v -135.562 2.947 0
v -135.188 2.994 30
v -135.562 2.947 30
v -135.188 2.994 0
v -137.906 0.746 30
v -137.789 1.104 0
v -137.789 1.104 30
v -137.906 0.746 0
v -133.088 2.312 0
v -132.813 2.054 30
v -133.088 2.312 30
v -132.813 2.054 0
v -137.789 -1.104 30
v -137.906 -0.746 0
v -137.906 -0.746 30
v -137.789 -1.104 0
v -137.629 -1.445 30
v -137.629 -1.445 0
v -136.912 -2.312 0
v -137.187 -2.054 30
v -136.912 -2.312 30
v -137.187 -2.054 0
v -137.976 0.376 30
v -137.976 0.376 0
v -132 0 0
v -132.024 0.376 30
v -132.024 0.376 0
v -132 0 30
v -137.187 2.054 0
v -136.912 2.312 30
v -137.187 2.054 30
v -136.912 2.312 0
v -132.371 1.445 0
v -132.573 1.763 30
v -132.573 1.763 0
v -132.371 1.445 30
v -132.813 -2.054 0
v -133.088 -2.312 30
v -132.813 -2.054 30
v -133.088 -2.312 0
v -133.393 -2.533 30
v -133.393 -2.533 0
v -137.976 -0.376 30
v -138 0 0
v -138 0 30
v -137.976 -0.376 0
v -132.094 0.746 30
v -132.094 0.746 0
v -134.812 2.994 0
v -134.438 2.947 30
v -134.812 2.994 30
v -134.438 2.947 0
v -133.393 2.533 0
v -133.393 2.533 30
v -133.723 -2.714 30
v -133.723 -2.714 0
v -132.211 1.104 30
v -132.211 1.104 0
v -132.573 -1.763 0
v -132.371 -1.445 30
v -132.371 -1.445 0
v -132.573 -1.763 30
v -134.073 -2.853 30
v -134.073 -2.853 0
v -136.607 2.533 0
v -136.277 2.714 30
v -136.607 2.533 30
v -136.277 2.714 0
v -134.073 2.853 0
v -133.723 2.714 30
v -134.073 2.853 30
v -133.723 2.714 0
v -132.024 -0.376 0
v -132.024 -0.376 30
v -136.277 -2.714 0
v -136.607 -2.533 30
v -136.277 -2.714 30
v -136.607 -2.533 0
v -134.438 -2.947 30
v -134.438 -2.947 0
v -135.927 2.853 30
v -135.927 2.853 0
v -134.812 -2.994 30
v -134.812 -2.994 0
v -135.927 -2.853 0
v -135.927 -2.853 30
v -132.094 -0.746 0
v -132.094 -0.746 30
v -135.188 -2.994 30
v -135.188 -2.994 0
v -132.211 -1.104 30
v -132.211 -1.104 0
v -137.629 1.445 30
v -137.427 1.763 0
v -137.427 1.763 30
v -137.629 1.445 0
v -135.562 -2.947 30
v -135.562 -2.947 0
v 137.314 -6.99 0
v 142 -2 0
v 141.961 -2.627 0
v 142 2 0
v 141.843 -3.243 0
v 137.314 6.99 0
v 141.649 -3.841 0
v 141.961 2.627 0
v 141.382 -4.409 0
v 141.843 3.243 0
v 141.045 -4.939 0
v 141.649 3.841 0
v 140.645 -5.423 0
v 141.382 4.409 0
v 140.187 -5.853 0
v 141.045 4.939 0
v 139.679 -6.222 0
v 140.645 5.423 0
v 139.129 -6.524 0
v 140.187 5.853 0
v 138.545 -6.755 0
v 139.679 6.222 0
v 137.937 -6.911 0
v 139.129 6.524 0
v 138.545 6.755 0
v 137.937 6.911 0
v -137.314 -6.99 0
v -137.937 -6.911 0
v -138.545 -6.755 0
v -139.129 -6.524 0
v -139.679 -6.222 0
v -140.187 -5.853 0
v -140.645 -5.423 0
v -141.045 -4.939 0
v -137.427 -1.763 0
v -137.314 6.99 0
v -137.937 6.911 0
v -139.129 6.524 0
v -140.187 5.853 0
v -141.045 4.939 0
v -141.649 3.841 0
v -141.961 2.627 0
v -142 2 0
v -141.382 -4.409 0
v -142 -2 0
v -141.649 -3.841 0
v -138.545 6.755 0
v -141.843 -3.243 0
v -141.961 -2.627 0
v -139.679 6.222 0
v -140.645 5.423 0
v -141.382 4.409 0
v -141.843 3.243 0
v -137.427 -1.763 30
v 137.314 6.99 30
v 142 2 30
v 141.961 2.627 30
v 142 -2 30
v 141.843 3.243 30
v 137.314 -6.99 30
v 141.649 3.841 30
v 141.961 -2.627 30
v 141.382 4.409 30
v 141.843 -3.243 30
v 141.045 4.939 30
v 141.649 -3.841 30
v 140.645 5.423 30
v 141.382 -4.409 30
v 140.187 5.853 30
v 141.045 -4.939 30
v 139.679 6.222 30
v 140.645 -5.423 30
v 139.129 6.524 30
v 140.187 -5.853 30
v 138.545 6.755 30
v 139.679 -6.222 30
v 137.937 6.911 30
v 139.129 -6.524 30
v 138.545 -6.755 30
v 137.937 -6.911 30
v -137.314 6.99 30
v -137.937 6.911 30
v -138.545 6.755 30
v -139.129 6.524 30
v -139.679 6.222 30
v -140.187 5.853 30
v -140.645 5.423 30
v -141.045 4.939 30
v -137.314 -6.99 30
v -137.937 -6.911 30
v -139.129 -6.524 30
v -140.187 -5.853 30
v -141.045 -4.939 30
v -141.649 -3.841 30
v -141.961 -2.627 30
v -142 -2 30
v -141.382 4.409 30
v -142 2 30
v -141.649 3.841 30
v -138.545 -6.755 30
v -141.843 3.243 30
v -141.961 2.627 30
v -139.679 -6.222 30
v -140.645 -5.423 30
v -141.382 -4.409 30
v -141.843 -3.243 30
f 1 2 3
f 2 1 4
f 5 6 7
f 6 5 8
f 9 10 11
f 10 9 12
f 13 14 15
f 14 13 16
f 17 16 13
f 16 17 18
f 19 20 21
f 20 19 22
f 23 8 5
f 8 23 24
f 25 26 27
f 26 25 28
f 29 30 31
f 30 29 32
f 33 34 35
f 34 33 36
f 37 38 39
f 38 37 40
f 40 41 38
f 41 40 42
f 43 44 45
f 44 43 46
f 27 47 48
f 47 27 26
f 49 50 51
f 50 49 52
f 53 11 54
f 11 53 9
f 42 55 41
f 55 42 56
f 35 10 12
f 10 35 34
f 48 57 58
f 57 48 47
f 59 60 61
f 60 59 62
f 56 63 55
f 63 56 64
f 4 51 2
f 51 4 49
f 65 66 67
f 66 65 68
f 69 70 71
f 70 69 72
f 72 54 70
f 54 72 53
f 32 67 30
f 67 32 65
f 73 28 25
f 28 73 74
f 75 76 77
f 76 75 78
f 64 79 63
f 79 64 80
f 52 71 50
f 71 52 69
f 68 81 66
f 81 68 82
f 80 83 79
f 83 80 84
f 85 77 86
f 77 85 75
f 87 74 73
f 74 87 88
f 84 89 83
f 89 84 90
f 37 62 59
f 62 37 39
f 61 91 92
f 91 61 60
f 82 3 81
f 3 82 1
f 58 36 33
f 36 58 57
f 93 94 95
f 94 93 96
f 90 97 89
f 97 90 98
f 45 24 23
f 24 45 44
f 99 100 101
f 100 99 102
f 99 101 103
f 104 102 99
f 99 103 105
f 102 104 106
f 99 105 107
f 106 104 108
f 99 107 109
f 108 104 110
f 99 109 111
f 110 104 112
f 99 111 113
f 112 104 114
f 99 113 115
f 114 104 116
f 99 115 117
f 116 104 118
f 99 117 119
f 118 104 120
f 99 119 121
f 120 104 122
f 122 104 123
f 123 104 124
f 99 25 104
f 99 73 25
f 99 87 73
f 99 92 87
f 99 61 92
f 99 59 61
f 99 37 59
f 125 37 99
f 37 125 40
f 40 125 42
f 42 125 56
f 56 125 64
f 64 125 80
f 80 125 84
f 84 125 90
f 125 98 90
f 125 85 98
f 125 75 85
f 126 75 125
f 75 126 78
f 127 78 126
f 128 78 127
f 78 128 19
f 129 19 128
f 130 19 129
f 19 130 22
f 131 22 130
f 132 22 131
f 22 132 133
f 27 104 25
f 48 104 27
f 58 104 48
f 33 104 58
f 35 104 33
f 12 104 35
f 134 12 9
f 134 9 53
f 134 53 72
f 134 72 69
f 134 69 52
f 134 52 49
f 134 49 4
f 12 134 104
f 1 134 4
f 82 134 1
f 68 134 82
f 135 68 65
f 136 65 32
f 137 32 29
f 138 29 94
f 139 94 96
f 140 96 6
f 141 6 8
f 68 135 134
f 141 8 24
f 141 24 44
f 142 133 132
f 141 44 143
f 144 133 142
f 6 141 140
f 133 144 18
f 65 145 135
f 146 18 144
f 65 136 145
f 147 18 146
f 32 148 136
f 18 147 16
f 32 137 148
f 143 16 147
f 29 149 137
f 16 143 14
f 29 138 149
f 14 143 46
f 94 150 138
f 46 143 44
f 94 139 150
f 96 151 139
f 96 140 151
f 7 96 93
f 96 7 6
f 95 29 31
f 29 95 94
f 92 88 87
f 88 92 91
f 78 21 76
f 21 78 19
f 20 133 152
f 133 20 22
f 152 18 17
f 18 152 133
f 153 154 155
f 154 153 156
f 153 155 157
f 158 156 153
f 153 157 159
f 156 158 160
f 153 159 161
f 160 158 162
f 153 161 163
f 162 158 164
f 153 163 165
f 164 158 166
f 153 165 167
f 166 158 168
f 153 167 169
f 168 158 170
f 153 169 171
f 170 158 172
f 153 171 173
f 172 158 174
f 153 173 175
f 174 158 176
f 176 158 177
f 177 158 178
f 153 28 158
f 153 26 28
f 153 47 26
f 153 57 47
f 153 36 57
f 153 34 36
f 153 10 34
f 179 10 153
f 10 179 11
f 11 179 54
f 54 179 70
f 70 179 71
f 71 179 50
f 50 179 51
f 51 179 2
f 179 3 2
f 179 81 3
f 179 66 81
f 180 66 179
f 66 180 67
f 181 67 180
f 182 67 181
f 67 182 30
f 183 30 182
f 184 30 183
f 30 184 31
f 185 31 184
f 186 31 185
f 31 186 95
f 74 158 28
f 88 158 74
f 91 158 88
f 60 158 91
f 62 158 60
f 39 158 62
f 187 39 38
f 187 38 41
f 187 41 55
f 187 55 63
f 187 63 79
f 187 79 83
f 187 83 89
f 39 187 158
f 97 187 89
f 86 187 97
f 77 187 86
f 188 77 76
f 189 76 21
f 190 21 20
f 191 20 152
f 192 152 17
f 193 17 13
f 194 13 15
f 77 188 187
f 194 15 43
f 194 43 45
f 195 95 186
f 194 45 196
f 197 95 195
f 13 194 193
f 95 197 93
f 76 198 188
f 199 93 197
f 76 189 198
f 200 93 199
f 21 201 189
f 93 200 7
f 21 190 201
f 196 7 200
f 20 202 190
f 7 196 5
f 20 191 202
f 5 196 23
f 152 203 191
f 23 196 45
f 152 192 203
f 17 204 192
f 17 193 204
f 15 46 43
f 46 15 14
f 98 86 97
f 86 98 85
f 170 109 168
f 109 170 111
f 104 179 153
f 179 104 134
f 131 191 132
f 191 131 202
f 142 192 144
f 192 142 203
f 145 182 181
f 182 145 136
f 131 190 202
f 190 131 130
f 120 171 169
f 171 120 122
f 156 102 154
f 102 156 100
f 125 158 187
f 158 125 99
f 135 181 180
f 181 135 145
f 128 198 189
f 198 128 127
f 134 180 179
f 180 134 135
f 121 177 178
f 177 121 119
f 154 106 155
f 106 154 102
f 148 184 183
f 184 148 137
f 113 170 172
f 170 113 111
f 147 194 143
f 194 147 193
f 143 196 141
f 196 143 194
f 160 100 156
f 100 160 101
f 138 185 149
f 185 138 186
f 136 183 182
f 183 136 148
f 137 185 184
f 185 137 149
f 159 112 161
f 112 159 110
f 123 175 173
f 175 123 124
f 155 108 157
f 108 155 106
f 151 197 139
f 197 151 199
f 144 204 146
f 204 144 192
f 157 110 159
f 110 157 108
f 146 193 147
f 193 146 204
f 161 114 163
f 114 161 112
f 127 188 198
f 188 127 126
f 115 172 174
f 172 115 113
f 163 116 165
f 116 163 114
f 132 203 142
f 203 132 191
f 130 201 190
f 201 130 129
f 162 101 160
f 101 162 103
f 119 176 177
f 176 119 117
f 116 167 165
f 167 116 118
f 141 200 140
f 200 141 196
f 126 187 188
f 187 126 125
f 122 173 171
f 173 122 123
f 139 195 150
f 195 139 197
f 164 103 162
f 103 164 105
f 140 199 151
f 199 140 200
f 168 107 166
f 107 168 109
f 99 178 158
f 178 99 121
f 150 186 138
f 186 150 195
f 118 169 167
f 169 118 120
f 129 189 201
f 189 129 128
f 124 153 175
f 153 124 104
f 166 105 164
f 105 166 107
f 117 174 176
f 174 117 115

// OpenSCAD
$fn = 50;


difference() {
	union() {
		hull() {
			translate(v = [-137.0000000000, 2.0000000000, 0]) {
				cylinder(h = 30, r = 5);
			}
			translate(v = [137.0000000000, 2.0000000000, 0]) {
				cylinder(h = 30, r = 5);
			}
			translate(v = [-137.0000000000, -2.0000000000, 0]) {
				cylinder(h = 30, r = 5);
			}
			translate(v = [137.0000000000, -2.0000000000, 0]) {
				cylinder(h = 30, r = 5);
			}
		}
	}
	union() {
		translate(v = [-135.0000000000, 0.0000000000, 0]) {
			cylinder(h = 30, r = 3.0000000000);
		}
		translate(v = [-135.0000000000, 0.0000000000, 0]) {
			cylinder(h = 30, r = 1.5000000000);
		}
		translate(v = [-135.0000000000, 0.0000000000, 0]) {
			cylinder(h = 30, r = 1.5000000000);
		}
		translate(v = [-135.0000000000, 0.0000000000, 0]) {
			cylinder(h = 30, r = 1.5000000000);
		}
	}
}
